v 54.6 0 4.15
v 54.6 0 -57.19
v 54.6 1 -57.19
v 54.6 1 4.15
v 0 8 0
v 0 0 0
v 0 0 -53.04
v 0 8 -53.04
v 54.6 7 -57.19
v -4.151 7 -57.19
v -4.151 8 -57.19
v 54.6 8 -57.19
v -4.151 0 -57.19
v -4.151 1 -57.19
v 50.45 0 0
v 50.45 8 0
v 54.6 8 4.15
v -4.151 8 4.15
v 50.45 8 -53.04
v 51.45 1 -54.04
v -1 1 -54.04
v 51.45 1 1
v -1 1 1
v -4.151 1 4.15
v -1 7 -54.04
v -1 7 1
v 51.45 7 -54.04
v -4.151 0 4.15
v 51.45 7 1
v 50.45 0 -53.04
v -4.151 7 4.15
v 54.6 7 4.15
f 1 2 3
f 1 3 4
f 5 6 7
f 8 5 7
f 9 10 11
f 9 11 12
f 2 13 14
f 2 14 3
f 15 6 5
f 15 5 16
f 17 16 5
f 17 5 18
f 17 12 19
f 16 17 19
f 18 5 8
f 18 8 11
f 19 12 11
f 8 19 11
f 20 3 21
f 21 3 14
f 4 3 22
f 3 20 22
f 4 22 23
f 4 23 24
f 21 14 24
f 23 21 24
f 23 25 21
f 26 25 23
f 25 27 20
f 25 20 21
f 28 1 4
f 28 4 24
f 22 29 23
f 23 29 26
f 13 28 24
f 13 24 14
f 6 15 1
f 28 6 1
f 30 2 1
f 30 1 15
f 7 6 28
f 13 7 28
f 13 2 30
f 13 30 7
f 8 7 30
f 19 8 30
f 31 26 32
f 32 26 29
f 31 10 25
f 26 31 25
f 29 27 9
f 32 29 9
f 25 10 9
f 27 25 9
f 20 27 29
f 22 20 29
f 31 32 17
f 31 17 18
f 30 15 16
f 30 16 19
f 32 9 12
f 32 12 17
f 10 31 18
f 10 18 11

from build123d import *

# Parameters (mm, degrees)
SKETCH1_W               = 50.45
SKETCH1_H               = 53.04
BOSS_EXTRUDE1_DEPTH     = 8
CUT_EXTRUDE1_DEPTH      = 6
CUT_EXTRUDE2_DEPTH      = 6
CUT_EXTRUDE3_DEPTH      = 6
CUT_EXTRUDE4_DEPTH      = 6
CUT_EXTRUDE5_DEPTH      = 21
CUT_EXTRUDE5_DEPTH_BACK = 19
SKETCH6_W               = 64.45
SKETCH6_H               = 67.04


with BuildPart() as part:
    # Sketch1 → Boss-Extrude1 (new body)
    with BuildSketch(Plane(origin=(0, 0, 0), x_dir=(1, 0, 0), z_dir=(0, 1, 0))):
        Polygon((50.45, 60.04), (57.45, 60.04), (57.45, 53.04), (57.45, 0), (57.45, -7), (50.45, -7), (0, -7), (-7, -7), (-7, 53.04), (-7, 60.04), (0, 60.04), align=None)
        with Locations((25.225, 26.52)):
            Rectangle(SKETCH1_W, SKETCH1_H, mode=Mode.SUBTRACT)
    extrude(amount=BOSS_EXTRUDE1_DEPTH)

    # Sketch2 → Cut-Extrude1 (cut)
    with BuildSketch(Plane.XY.offset(7)):
        Polygon((-7, 7), (72.572595869, 7), (72.572595869, 1), (-15.083079444, 1), (-15.083079444, 7), align=None)
    extrude(amount=-CUT_EXTRUDE1_DEPTH, mode=Mode.SUBTRACT)

    # Sketch3 → Cut-Extrude2 (cut)
    with BuildSketch(Plane.ZY.offset(7)):
        Polygon((1, 7), (-62.487898414, 7), (-62.487898414, 1), (1, 1), (11.114700275, 1), (11.114700275, 7), align=None)
    extrude(amount=-CUT_EXTRUDE2_DEPTH, mode=Mode.SUBTRACT)

    # Sketch4 → Cut-Extrude3 (cut)
    with BuildSketch(Plane(origin=(0, 0, -60.04), x_dir=(-1, 0, 0), z_dir=(0, 0, -1))):
        Polygon((1, 7), (-63.689958153, 7), (-63.689958153, 1), (1, 1), (11.838030302, 1), (11.838030302, 7), align=None)
    extrude(amount=-CUT_EXTRUDE3_DEPTH, mode=Mode.SUBTRACT)

    # Sketch5 → Cut-Extrude4 (cut)
    with BuildSketch(Plane(origin=(57.45, 0, 0), x_dir=(0, 0, -1), z_dir=(1, 0, 0))):
        Polygon((-1, 7), (54.04, 7), (62.072343262, 7), (62.072343262, 1), (-1, 1), (-8.754047033, 1), (-8.754047033, 7), align=None)
    extrude(amount=-CUT_EXTRUDE4_DEPTH, mode=Mode.SUBTRACT)

    # Sketch6 → Cut-Extrude5 (cut, two sides: drawn at the far end of the back side and taken through both)
    with BuildSketch(Plane(origin=(0, 8, 0), x_dir=(1, 0, 0), z_dir=(0, 1, 0)).offset(-CUT_EXTRUDE5_DEPTH_BACK)):
        with Locations((25.225, 26.52)):
            Rectangle(SKETCH6_W, SKETCH6_H)
        Polygon((-4.150556557, 26.52), (-4.150556557, 57.19), (54.6, 57.19), (54.6, -4.15), (-4.150556557, -4.15), align=None, mode=Mode.SUBTRACT)
    extrude(amount=CUT_EXTRUDE5_DEPTH + CUT_EXTRUDE5_DEPTH_BACK, mode=Mode.SUBTRACT)


solid = part.part
